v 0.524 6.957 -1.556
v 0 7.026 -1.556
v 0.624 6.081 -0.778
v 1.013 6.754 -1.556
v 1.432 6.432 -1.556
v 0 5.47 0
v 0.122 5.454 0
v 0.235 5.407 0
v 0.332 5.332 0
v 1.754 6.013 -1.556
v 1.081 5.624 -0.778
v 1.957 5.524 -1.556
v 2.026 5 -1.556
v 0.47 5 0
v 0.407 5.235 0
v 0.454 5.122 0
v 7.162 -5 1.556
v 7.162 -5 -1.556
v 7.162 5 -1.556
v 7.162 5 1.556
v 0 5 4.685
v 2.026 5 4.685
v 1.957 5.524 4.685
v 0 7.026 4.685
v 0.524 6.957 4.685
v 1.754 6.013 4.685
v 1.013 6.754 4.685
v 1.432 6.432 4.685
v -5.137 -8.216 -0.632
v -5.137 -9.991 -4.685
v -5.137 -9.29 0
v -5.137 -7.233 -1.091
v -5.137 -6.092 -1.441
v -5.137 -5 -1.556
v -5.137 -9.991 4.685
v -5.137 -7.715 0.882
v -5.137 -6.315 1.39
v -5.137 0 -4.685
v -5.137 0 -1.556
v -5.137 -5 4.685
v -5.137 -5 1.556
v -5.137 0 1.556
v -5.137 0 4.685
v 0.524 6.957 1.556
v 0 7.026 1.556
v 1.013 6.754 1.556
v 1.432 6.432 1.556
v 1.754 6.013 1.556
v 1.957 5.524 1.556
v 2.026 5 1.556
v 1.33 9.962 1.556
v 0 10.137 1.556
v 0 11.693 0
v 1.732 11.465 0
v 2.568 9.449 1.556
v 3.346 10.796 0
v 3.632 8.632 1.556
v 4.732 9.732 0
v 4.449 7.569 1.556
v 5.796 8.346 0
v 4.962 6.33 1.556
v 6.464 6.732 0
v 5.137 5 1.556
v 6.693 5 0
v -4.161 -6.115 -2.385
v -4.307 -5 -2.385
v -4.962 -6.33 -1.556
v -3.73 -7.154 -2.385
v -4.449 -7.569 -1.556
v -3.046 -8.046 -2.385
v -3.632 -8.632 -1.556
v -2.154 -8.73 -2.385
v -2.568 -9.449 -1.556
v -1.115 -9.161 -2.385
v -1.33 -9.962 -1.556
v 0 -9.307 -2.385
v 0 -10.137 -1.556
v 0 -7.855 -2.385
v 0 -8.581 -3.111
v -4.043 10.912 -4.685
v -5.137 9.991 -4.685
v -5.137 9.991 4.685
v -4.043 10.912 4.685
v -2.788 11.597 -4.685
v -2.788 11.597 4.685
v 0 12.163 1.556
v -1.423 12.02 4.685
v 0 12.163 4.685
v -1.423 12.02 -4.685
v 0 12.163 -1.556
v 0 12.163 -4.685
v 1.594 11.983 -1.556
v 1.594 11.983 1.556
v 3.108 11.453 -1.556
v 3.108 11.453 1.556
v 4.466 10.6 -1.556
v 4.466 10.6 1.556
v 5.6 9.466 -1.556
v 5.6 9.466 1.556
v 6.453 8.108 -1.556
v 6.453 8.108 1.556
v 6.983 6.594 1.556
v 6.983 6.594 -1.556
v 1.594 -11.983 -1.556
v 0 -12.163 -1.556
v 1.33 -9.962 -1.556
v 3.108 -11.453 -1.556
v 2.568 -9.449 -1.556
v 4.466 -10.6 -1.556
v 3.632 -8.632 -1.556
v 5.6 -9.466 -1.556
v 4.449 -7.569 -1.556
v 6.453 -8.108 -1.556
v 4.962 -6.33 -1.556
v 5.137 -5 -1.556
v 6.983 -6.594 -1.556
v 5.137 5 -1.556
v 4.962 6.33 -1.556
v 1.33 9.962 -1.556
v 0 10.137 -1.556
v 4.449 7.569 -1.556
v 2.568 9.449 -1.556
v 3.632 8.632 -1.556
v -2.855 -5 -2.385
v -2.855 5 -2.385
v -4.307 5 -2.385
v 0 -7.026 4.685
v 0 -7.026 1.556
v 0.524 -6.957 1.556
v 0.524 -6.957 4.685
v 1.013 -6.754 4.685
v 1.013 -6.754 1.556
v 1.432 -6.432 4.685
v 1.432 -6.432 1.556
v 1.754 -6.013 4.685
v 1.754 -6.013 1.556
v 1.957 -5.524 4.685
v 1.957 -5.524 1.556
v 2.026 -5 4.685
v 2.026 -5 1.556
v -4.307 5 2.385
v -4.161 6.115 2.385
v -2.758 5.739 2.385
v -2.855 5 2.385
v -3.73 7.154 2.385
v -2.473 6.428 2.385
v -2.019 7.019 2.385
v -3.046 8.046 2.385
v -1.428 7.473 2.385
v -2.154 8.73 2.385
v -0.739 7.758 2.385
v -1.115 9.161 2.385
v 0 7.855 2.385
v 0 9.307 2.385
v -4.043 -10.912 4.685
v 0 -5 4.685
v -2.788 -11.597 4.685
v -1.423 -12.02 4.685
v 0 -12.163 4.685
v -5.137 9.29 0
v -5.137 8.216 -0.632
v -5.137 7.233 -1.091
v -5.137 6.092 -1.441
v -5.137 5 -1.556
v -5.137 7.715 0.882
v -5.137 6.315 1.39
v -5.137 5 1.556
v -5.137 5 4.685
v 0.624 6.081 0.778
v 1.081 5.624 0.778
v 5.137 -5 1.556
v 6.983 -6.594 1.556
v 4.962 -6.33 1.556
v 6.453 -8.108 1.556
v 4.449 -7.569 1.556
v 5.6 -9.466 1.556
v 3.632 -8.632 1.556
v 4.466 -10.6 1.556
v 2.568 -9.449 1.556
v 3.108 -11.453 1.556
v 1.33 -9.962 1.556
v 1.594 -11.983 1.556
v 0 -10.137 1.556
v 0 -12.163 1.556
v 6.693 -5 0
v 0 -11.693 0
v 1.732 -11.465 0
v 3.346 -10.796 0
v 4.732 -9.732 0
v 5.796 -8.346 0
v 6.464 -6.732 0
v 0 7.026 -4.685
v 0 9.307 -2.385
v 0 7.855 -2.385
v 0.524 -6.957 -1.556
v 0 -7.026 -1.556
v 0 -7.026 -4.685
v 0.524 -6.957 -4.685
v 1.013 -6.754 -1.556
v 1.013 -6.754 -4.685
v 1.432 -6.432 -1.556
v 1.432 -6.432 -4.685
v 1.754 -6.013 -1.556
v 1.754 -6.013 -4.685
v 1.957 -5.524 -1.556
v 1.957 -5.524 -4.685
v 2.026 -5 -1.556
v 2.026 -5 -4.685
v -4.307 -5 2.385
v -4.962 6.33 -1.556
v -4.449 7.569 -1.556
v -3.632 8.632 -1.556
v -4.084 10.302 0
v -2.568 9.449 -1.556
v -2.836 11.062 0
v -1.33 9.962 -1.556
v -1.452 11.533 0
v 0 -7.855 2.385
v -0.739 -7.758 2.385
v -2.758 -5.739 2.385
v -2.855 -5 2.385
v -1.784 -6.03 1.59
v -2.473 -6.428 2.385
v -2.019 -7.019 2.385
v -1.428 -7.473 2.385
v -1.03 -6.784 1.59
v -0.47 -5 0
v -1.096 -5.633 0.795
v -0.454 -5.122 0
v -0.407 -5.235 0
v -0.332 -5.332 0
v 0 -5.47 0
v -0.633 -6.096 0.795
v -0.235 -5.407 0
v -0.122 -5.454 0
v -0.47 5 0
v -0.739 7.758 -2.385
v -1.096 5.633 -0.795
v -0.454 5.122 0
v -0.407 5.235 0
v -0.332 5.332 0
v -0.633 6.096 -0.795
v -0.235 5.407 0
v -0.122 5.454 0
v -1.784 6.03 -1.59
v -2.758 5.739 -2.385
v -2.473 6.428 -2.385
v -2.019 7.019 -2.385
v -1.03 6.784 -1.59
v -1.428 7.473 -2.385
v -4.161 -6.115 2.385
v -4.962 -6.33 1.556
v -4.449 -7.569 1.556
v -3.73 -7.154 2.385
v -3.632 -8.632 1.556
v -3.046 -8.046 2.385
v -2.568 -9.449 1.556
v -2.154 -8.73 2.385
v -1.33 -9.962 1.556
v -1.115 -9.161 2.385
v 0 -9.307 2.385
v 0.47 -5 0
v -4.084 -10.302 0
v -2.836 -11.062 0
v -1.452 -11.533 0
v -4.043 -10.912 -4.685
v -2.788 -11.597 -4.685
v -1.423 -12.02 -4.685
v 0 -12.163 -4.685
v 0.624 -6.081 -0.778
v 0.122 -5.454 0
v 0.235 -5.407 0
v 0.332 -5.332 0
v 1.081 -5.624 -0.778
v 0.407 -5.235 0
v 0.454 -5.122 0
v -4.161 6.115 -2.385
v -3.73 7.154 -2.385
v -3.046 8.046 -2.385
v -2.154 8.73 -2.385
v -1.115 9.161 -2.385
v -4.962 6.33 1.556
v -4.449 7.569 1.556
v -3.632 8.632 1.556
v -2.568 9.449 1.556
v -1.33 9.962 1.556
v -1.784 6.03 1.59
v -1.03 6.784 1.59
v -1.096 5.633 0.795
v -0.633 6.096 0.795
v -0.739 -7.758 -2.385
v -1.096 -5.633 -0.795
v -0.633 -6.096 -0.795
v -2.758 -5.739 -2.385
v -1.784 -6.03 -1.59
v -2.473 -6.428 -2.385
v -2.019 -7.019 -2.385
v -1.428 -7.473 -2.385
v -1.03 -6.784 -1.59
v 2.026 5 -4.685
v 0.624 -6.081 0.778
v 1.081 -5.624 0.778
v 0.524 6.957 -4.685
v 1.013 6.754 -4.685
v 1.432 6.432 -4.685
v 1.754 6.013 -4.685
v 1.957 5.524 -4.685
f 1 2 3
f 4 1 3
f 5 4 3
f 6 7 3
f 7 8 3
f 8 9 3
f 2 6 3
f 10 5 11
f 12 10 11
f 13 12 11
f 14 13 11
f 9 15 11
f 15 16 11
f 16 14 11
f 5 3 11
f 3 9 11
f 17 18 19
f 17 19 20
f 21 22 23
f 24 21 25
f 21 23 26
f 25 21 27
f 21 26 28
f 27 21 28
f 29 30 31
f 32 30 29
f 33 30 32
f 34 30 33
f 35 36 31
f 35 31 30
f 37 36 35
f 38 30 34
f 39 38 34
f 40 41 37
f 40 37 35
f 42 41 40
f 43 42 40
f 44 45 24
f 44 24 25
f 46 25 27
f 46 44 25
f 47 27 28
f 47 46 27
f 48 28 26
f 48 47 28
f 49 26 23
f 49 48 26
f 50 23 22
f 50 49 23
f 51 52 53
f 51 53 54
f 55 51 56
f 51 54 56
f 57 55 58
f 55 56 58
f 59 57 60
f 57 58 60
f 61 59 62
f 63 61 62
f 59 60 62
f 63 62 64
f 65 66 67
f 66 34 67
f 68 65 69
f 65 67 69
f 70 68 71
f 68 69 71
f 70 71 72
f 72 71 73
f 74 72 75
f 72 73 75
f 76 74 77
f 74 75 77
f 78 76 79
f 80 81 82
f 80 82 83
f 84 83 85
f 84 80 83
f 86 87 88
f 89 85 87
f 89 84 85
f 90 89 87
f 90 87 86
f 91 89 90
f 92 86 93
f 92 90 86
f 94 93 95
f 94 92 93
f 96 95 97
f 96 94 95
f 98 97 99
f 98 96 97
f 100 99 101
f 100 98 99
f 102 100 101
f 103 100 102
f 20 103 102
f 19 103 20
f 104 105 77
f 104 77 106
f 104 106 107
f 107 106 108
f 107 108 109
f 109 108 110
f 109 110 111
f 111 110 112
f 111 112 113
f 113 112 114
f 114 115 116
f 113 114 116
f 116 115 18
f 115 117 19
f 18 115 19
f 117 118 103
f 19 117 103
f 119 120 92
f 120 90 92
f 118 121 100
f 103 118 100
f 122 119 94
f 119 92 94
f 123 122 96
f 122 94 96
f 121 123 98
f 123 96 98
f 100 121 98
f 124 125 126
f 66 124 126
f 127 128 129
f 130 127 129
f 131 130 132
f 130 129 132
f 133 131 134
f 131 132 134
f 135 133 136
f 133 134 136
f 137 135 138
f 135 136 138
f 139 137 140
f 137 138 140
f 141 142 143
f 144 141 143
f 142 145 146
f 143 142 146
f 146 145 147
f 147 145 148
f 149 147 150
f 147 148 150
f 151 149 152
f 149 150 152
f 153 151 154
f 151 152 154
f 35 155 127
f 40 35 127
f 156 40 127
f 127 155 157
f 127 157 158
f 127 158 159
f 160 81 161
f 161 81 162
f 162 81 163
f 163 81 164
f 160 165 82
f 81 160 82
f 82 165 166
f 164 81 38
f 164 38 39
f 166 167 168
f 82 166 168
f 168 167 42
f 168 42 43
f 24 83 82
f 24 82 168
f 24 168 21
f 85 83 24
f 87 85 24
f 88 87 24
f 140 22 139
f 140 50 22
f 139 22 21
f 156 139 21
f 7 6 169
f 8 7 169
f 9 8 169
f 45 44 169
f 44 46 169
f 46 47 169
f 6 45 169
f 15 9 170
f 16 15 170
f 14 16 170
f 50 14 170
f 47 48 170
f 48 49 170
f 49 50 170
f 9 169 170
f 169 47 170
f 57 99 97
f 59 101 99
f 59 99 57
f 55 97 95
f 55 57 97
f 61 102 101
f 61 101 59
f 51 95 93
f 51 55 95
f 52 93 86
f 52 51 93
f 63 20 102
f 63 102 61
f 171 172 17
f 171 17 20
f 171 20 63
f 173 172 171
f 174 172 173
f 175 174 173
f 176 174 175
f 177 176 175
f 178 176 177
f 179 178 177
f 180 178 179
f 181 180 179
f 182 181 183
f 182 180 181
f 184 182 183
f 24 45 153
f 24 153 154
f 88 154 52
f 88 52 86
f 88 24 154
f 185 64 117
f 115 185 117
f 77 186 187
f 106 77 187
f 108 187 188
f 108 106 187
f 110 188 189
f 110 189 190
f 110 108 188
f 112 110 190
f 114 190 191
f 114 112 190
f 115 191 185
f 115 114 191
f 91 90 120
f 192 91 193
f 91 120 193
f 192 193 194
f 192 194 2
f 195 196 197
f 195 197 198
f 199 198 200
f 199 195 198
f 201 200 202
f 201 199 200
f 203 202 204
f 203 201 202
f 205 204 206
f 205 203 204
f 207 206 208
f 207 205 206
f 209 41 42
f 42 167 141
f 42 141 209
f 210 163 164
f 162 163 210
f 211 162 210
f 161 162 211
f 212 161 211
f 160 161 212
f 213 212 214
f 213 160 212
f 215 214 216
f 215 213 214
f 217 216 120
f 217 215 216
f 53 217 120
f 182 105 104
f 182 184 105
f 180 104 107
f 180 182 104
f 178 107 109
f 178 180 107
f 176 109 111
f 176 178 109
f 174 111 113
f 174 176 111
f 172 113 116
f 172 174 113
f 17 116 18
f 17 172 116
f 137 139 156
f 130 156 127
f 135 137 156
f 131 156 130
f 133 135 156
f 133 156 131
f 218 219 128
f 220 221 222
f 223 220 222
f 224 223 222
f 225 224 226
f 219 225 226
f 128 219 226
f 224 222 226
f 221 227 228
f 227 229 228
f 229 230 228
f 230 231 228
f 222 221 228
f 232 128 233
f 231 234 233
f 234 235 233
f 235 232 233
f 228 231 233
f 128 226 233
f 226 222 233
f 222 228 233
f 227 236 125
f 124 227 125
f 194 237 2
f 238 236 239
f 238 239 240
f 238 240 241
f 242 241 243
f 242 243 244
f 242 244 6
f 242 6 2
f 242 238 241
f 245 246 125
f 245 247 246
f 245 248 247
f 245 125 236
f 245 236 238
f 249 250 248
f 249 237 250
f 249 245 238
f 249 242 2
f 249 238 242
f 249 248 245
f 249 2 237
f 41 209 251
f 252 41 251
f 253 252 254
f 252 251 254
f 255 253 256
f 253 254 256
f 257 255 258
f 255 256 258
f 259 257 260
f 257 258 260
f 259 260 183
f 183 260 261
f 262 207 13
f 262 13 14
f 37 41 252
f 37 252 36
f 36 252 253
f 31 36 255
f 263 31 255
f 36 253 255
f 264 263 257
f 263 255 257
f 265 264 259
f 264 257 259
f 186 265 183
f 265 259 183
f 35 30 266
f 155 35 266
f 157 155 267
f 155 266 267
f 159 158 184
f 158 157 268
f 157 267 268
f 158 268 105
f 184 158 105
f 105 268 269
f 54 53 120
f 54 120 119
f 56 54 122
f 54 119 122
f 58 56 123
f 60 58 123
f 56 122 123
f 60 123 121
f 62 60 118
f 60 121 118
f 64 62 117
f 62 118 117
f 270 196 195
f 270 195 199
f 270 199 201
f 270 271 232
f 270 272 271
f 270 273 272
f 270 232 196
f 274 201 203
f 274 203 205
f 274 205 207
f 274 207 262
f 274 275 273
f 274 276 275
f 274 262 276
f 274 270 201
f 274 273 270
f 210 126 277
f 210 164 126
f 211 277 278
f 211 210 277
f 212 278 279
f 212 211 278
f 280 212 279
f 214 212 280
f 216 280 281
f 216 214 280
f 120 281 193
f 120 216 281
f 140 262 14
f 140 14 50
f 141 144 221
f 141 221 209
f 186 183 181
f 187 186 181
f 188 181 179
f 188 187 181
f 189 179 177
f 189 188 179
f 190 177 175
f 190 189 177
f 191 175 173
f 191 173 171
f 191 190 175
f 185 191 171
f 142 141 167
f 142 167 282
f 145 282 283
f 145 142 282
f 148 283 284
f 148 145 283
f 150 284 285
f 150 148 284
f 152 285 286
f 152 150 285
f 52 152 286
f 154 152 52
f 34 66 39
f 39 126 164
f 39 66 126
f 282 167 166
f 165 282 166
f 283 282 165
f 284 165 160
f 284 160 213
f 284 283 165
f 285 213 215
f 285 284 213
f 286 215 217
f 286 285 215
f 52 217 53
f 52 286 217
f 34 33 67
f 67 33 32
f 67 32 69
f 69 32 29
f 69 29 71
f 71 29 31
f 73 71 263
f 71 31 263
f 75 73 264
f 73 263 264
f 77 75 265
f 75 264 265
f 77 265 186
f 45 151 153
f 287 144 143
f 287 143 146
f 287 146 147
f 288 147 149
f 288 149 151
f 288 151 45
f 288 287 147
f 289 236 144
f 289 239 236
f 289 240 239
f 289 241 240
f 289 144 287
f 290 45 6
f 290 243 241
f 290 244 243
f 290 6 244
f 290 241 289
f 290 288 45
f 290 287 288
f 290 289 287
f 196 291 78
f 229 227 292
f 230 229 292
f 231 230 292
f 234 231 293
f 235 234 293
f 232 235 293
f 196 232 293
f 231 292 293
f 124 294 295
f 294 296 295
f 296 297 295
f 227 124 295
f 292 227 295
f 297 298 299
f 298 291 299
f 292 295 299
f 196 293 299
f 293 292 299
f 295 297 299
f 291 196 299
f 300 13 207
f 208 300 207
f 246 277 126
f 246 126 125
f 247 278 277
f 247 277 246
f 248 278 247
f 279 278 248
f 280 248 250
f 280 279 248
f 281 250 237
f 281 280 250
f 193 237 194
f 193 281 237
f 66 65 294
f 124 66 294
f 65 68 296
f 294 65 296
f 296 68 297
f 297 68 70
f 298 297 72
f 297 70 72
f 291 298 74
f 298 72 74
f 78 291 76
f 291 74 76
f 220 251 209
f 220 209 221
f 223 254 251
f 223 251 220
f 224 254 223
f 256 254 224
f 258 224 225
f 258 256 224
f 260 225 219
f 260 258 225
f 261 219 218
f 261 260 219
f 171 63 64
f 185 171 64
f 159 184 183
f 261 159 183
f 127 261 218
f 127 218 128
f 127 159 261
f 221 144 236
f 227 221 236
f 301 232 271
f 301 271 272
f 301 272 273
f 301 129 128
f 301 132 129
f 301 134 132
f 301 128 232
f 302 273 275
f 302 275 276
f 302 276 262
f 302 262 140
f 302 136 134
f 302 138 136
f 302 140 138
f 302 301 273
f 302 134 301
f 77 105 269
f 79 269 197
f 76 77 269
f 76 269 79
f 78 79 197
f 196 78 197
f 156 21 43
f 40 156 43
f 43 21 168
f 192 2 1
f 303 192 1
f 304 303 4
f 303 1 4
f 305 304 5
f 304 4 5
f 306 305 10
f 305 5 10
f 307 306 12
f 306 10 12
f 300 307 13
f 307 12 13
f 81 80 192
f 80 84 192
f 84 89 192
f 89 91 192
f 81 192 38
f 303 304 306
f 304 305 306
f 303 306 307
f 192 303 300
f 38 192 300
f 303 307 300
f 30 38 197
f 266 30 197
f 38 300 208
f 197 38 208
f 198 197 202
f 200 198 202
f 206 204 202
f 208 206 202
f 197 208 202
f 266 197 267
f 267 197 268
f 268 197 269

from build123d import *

# Parameters (mm, degrees)
F4_ANGLE       = 90
F6_ANGLE       = 90
F7_DEPTH       = 10
F10_DEPTH      = 3.1295758847
F11_DEPTH      = 3.1295758847
F13_DEPTH      = 14.5
F13_DEPTH_BACK = 25


with BuildPart() as f4:
    # F3 (on plane+point) → F4 (revolve)
    with BuildSketch(Plane.XZ.offset(-5.0000661737)):
        Polygon((-2.8551849101, 2.3852105297), (-2.0256090254, 1.555634645), (-0.4699743804, 0), (-2.0256090254, -1.555634645), (0, -1.555634645), (0, 0), (0, 1.555634645), (0, 4.6852105297), (-7.1624873409, 4.6852105297), (-7.1624873409, 1.555634645), (-7.1624873409, -1.555634645), (-5.1368783154, -1.555634645), (-6.6925129605, 0), (-5.1368783154, 1.555634645), (-4.3073024307, 2.3852105297), (-3.5812436704, 3.11126929), align=None)
        Polygon((-4.3073024307, -2.3852105297), (-5.1368783154, -1.555634645), (-7.1624873409, -1.555634645), (-7.1624873409, -4.6852105297), (0, -4.6852105297), (0, -1.555634645), (-2.0256090254, -1.555634645), (-2.8551849101, -2.3852105297), (-3.5812436704, -3.11126929), align=None)
        Polygon((-2.8551849101, -2.3852105297), (-3.5812436704, -2.3852105297), (-3.5812436704, -3.11126929), align=None)
        Polygon((-3.5812436704, -3.11126929), (-3.5812436704, -2.3852105297), (-4.3073024307, -2.3852105297), align=None)
    revolve(axis=Axis((0, 5.0000661737, -0.016850885), (0, 0, -1)), revolution_arc=F4_ANGLE)

    # F5 (on face) → F6 (revolve)
    with BuildSketch(Plane.YZ):
        Polygon((5.4700405542, 0), (7.0256751992, 1.555634645), (5.0000661737, 1.555634645), (5.0000661737, -1.555634645), (7.0256751992, -1.555634645), align=None)
        Polygon((12.1625535146, 1.555634645), (10.1369444892, 1.555634645), (11.6925791342, 0), (10.1369444892, -1.555634645), (12.1625535146, -1.555634645), align=None)
    revolve(axis=Axis((0, 5.0000661737, -0.016850885), (0, 0, -1)), revolution_arc=F6_ANGLE)

    # F7 (add): faces of the model
    f7_faces = [f4.faces().sort_by_distance(p)[0] for p in [
        (7.1253617587, 5.0000661737, 0),
        (-1.9422105795, 5.0000661737, 1.639033091),
        (1.0128045127, 5.0000661737, -1.5185090628),
    ]]
    extrude(f7_faces, amount=F7_DEPTH)

    # F8: F4 across plane


with BuildPart() as f4_1:
    add(f4.part)
    add(f4.part.mirror(Plane.XZ))

    # F9: F4 across plane


with BuildPart() as f4_2:
    add(f4_1.part)
    add(f4_1.part.mirror(Plane.XY))

    # F10 (add, through all): faces of the model
    f10_faces = [f4_2.faces().sort_by_distance(p)[0] for p in [
        (0.8596951711, 5.8597613449, -1.555634645),
        (1.0128045127, 5, -1.555634645),
        (1.0128045127, 0, -1.555634645),
        (1.0128045127, -5, -1.555634645),
        (0.8596951711, -5.8597613449, -1.555634645),
    ]]
    extrude(f10_faces, amount=F10_DEPTH)

    # F11 (add, through all): faces of the model
    f11_faces = [f4_2.faces().sort_by_distance(p)[0] for p in [
        (0.8596951711, 5.8597613449, 1.555634645),
        (1.0128045127, 5, 1.555634645),
        (1.0128045127, 0, 1.555634645),
        (1.0128045127, -5, 1.555634645),
        (0.8596951711, -5.8597613449, 1.555634645),
    ]]
    extrude(f11_faces, amount=F11_DEPTH)

    # F12 (on Front) → F13 (cut, two sides)
    with BuildSketch(Plane.XZ) as f13_sk:
        Polygon((-5.1368783154, -6.1799879186), (-5.1368783154, 5.2285962738), (-8.7532252073, 5.3635202348), (-9.4878124073, -3.8263113238), align=None)
    extrude(amount=-F13_DEPTH, mode=Mode.SUBTRACT)
    extrude(f13_sk.sketch, amount=F13_DEPTH_BACK, mode=Mode.SUBTRACT)


solid = f4_2.part
